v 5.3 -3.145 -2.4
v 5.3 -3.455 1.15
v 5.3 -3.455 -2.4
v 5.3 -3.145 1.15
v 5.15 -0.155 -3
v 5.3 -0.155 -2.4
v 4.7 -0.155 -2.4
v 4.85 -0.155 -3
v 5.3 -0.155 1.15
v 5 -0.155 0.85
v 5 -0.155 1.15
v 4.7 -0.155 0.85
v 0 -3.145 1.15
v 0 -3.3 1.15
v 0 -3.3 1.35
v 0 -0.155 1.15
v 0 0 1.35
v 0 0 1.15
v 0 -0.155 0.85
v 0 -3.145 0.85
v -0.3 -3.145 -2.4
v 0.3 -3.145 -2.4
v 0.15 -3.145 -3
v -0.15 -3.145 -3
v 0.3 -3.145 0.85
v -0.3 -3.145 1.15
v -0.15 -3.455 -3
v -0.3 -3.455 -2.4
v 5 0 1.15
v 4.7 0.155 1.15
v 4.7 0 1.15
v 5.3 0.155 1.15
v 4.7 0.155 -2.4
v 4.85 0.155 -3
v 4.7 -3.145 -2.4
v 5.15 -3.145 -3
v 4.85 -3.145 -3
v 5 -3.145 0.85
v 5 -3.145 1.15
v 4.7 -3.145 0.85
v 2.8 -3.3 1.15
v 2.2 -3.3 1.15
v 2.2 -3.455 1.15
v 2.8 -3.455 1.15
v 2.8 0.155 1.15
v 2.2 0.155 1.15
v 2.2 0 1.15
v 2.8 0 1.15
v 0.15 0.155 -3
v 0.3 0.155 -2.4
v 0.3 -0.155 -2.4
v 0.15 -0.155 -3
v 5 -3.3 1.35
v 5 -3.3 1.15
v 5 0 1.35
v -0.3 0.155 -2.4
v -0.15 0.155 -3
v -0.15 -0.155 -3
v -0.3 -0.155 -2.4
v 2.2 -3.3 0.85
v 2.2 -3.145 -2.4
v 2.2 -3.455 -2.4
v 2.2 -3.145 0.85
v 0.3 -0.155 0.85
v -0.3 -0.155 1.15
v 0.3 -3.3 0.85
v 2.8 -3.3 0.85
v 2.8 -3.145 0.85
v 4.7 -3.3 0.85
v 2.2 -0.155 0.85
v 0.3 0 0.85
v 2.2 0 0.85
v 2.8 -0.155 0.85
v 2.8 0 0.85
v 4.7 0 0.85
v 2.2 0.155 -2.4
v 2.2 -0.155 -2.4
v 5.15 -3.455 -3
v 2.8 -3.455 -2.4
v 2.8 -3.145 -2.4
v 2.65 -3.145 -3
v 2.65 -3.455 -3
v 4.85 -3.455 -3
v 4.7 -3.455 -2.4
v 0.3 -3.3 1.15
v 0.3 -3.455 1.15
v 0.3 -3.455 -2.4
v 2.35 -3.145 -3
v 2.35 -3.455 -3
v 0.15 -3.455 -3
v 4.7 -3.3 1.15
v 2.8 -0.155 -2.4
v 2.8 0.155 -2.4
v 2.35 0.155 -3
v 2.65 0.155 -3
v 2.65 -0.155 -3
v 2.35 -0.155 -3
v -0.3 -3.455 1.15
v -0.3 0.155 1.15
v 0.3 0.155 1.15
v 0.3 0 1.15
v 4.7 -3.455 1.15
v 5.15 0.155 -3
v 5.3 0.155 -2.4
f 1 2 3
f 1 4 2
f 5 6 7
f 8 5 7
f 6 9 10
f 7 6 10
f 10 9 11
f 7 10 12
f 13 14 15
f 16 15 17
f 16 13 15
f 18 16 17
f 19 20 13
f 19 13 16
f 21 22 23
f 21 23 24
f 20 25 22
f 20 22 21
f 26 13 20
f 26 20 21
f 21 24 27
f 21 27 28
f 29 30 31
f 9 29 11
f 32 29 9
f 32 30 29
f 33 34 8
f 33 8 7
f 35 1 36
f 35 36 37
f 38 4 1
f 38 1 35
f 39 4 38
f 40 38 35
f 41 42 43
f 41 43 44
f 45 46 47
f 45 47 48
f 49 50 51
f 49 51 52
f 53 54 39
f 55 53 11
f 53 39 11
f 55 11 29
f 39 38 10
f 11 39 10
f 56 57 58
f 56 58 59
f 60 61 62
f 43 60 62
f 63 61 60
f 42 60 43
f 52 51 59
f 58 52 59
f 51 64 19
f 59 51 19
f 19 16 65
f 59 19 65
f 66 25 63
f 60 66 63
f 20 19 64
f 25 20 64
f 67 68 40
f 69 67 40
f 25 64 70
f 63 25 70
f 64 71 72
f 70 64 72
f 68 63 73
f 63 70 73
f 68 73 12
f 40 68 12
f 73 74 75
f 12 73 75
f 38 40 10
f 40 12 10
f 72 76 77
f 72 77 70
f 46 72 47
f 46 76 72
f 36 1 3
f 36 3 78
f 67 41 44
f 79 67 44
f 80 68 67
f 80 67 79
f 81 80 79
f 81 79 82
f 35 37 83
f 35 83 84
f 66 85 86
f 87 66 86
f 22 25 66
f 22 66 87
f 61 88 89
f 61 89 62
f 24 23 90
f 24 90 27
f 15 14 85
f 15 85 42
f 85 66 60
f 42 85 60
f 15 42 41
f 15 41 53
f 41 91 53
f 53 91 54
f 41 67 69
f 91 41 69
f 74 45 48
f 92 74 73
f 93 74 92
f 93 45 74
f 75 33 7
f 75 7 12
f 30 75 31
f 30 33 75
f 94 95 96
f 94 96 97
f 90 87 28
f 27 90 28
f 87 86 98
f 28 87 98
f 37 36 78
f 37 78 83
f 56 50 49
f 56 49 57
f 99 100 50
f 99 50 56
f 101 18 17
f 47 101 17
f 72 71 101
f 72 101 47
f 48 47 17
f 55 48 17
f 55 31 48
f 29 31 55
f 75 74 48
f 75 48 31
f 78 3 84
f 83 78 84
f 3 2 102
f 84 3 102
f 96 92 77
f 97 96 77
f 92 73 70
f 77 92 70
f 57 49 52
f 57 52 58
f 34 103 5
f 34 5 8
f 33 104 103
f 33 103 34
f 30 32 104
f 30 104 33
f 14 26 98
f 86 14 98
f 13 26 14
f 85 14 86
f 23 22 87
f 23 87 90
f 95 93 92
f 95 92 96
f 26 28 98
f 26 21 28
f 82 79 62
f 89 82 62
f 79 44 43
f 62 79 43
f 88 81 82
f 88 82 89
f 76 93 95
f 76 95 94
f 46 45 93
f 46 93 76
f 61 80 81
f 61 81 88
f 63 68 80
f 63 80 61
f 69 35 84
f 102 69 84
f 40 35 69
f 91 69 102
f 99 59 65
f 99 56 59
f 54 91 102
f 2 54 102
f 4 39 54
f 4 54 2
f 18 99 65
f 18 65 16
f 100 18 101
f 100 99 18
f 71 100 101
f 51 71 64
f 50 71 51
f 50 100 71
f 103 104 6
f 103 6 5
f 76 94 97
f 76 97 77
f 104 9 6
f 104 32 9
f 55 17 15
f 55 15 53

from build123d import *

# Parameters (mm, degrees)
SKETCH017_W                  = 5
SKETCH017_H                  = 3.3
PAD009_DEPTH                 = 0.5
PAD010_DEPTH                 = 0.155
PAD010_LINEARPATTERN_2_DEPTH = 0.155
PAD010_LINEARPATTERN_3_DEPTH = 0.155
LINEARPATTERN001_COUNT       = 2
LINEARPATTERN001_PITCH       = 3.3


with BuildPart() as part:
    # Sketch017 (on DatumPlane) → Pad009 (new body)
    with BuildSketch(Plane.XY.offset(0.85)):
        with Locations((2.5, -1.65)):
            Rectangle(SKETCH017_W, SKETCH017_H)
    extrude(amount=PAD009_DEPTH)

    # Sketch018 (on Face1 of Pad009) → Pad010 (join, symmetric)
    with BuildSketch(Plane(origin=(0, 0, 0.85), x_dir=(-1, 0, 0), z_dir=(0, 1, 0))):
        Polygon((-0.3, 0.3), (-0.3, -3.25), (-0.15, -3.85), (0.15, -3.85), (0.3, -3.25), (0.3, 0.3), align=None)
    pad010 = extrude(amount=PAD010_DEPTH, both=True)

    # Sketch018 LinearPattern 2 → Pad010 LinearPattern 2 (add, symmetric)
    with BuildSketch(Plane(origin=(2.5, 0, 0.85), x_dir=(-1, 0, 0), z_dir=(0, 1, 0))):
        Polygon((-0.3, 0.3), (-0.3, -3.25), (-0.15, -3.85), (0.15, -3.85), (0.3, -3.25), (0.3, 0.3), align=None)
    pad010_linearpattern_2 = extrude(amount=PAD010_LINEARPATTERN_2_DEPTH, both=True)

    # Sketch018 LinearPattern 3 → Pad010 LinearPattern 3 (add, symmetric)
    with BuildSketch(Plane(origin=(5, 0, 0.85), x_dir=(-1, 0, 0), z_dir=(0, 1, 0))):
        Polygon((-0.3, 0.3), (-0.3, -3.25), (-0.15, -3.85), (0.15, -3.85), (0.3, -3.25), (0.3, 0.3), align=None)
    pad010_linearpattern_3 = extrude(amount=PAD010_LINEARPATTERN_3_DEPTH, both=True)

    # LinearPattern001: Pad010, Pad010 LinearPattern 2, Pad010 LinearPattern 3 ×2
    with Locations(*[(0, -i * LINEARPATTERN001_PITCH, 0) for i in range(1, LINEARPATTERN001_COUNT)]):
        add(pad010)
        add(pad010_linearpattern_2)
        add(pad010_linearpattern_3)


solid = part.part
